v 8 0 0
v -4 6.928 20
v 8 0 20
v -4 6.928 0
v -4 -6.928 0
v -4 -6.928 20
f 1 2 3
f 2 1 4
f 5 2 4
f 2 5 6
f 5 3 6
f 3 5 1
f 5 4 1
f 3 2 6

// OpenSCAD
// Auto-generated from tests/data/feature_fixtures_manifest.json
// fixture: prism_triangle
// fixture_type: prism
// description: Triangular prism (3 sides); negative for cylinder, positive for linear_extrude_solid.
$fn = 96;

radius = 8.000000;
height = 20.000000;
sides = 3;

cylinder(r=radius, h=height, $fn=sides);
